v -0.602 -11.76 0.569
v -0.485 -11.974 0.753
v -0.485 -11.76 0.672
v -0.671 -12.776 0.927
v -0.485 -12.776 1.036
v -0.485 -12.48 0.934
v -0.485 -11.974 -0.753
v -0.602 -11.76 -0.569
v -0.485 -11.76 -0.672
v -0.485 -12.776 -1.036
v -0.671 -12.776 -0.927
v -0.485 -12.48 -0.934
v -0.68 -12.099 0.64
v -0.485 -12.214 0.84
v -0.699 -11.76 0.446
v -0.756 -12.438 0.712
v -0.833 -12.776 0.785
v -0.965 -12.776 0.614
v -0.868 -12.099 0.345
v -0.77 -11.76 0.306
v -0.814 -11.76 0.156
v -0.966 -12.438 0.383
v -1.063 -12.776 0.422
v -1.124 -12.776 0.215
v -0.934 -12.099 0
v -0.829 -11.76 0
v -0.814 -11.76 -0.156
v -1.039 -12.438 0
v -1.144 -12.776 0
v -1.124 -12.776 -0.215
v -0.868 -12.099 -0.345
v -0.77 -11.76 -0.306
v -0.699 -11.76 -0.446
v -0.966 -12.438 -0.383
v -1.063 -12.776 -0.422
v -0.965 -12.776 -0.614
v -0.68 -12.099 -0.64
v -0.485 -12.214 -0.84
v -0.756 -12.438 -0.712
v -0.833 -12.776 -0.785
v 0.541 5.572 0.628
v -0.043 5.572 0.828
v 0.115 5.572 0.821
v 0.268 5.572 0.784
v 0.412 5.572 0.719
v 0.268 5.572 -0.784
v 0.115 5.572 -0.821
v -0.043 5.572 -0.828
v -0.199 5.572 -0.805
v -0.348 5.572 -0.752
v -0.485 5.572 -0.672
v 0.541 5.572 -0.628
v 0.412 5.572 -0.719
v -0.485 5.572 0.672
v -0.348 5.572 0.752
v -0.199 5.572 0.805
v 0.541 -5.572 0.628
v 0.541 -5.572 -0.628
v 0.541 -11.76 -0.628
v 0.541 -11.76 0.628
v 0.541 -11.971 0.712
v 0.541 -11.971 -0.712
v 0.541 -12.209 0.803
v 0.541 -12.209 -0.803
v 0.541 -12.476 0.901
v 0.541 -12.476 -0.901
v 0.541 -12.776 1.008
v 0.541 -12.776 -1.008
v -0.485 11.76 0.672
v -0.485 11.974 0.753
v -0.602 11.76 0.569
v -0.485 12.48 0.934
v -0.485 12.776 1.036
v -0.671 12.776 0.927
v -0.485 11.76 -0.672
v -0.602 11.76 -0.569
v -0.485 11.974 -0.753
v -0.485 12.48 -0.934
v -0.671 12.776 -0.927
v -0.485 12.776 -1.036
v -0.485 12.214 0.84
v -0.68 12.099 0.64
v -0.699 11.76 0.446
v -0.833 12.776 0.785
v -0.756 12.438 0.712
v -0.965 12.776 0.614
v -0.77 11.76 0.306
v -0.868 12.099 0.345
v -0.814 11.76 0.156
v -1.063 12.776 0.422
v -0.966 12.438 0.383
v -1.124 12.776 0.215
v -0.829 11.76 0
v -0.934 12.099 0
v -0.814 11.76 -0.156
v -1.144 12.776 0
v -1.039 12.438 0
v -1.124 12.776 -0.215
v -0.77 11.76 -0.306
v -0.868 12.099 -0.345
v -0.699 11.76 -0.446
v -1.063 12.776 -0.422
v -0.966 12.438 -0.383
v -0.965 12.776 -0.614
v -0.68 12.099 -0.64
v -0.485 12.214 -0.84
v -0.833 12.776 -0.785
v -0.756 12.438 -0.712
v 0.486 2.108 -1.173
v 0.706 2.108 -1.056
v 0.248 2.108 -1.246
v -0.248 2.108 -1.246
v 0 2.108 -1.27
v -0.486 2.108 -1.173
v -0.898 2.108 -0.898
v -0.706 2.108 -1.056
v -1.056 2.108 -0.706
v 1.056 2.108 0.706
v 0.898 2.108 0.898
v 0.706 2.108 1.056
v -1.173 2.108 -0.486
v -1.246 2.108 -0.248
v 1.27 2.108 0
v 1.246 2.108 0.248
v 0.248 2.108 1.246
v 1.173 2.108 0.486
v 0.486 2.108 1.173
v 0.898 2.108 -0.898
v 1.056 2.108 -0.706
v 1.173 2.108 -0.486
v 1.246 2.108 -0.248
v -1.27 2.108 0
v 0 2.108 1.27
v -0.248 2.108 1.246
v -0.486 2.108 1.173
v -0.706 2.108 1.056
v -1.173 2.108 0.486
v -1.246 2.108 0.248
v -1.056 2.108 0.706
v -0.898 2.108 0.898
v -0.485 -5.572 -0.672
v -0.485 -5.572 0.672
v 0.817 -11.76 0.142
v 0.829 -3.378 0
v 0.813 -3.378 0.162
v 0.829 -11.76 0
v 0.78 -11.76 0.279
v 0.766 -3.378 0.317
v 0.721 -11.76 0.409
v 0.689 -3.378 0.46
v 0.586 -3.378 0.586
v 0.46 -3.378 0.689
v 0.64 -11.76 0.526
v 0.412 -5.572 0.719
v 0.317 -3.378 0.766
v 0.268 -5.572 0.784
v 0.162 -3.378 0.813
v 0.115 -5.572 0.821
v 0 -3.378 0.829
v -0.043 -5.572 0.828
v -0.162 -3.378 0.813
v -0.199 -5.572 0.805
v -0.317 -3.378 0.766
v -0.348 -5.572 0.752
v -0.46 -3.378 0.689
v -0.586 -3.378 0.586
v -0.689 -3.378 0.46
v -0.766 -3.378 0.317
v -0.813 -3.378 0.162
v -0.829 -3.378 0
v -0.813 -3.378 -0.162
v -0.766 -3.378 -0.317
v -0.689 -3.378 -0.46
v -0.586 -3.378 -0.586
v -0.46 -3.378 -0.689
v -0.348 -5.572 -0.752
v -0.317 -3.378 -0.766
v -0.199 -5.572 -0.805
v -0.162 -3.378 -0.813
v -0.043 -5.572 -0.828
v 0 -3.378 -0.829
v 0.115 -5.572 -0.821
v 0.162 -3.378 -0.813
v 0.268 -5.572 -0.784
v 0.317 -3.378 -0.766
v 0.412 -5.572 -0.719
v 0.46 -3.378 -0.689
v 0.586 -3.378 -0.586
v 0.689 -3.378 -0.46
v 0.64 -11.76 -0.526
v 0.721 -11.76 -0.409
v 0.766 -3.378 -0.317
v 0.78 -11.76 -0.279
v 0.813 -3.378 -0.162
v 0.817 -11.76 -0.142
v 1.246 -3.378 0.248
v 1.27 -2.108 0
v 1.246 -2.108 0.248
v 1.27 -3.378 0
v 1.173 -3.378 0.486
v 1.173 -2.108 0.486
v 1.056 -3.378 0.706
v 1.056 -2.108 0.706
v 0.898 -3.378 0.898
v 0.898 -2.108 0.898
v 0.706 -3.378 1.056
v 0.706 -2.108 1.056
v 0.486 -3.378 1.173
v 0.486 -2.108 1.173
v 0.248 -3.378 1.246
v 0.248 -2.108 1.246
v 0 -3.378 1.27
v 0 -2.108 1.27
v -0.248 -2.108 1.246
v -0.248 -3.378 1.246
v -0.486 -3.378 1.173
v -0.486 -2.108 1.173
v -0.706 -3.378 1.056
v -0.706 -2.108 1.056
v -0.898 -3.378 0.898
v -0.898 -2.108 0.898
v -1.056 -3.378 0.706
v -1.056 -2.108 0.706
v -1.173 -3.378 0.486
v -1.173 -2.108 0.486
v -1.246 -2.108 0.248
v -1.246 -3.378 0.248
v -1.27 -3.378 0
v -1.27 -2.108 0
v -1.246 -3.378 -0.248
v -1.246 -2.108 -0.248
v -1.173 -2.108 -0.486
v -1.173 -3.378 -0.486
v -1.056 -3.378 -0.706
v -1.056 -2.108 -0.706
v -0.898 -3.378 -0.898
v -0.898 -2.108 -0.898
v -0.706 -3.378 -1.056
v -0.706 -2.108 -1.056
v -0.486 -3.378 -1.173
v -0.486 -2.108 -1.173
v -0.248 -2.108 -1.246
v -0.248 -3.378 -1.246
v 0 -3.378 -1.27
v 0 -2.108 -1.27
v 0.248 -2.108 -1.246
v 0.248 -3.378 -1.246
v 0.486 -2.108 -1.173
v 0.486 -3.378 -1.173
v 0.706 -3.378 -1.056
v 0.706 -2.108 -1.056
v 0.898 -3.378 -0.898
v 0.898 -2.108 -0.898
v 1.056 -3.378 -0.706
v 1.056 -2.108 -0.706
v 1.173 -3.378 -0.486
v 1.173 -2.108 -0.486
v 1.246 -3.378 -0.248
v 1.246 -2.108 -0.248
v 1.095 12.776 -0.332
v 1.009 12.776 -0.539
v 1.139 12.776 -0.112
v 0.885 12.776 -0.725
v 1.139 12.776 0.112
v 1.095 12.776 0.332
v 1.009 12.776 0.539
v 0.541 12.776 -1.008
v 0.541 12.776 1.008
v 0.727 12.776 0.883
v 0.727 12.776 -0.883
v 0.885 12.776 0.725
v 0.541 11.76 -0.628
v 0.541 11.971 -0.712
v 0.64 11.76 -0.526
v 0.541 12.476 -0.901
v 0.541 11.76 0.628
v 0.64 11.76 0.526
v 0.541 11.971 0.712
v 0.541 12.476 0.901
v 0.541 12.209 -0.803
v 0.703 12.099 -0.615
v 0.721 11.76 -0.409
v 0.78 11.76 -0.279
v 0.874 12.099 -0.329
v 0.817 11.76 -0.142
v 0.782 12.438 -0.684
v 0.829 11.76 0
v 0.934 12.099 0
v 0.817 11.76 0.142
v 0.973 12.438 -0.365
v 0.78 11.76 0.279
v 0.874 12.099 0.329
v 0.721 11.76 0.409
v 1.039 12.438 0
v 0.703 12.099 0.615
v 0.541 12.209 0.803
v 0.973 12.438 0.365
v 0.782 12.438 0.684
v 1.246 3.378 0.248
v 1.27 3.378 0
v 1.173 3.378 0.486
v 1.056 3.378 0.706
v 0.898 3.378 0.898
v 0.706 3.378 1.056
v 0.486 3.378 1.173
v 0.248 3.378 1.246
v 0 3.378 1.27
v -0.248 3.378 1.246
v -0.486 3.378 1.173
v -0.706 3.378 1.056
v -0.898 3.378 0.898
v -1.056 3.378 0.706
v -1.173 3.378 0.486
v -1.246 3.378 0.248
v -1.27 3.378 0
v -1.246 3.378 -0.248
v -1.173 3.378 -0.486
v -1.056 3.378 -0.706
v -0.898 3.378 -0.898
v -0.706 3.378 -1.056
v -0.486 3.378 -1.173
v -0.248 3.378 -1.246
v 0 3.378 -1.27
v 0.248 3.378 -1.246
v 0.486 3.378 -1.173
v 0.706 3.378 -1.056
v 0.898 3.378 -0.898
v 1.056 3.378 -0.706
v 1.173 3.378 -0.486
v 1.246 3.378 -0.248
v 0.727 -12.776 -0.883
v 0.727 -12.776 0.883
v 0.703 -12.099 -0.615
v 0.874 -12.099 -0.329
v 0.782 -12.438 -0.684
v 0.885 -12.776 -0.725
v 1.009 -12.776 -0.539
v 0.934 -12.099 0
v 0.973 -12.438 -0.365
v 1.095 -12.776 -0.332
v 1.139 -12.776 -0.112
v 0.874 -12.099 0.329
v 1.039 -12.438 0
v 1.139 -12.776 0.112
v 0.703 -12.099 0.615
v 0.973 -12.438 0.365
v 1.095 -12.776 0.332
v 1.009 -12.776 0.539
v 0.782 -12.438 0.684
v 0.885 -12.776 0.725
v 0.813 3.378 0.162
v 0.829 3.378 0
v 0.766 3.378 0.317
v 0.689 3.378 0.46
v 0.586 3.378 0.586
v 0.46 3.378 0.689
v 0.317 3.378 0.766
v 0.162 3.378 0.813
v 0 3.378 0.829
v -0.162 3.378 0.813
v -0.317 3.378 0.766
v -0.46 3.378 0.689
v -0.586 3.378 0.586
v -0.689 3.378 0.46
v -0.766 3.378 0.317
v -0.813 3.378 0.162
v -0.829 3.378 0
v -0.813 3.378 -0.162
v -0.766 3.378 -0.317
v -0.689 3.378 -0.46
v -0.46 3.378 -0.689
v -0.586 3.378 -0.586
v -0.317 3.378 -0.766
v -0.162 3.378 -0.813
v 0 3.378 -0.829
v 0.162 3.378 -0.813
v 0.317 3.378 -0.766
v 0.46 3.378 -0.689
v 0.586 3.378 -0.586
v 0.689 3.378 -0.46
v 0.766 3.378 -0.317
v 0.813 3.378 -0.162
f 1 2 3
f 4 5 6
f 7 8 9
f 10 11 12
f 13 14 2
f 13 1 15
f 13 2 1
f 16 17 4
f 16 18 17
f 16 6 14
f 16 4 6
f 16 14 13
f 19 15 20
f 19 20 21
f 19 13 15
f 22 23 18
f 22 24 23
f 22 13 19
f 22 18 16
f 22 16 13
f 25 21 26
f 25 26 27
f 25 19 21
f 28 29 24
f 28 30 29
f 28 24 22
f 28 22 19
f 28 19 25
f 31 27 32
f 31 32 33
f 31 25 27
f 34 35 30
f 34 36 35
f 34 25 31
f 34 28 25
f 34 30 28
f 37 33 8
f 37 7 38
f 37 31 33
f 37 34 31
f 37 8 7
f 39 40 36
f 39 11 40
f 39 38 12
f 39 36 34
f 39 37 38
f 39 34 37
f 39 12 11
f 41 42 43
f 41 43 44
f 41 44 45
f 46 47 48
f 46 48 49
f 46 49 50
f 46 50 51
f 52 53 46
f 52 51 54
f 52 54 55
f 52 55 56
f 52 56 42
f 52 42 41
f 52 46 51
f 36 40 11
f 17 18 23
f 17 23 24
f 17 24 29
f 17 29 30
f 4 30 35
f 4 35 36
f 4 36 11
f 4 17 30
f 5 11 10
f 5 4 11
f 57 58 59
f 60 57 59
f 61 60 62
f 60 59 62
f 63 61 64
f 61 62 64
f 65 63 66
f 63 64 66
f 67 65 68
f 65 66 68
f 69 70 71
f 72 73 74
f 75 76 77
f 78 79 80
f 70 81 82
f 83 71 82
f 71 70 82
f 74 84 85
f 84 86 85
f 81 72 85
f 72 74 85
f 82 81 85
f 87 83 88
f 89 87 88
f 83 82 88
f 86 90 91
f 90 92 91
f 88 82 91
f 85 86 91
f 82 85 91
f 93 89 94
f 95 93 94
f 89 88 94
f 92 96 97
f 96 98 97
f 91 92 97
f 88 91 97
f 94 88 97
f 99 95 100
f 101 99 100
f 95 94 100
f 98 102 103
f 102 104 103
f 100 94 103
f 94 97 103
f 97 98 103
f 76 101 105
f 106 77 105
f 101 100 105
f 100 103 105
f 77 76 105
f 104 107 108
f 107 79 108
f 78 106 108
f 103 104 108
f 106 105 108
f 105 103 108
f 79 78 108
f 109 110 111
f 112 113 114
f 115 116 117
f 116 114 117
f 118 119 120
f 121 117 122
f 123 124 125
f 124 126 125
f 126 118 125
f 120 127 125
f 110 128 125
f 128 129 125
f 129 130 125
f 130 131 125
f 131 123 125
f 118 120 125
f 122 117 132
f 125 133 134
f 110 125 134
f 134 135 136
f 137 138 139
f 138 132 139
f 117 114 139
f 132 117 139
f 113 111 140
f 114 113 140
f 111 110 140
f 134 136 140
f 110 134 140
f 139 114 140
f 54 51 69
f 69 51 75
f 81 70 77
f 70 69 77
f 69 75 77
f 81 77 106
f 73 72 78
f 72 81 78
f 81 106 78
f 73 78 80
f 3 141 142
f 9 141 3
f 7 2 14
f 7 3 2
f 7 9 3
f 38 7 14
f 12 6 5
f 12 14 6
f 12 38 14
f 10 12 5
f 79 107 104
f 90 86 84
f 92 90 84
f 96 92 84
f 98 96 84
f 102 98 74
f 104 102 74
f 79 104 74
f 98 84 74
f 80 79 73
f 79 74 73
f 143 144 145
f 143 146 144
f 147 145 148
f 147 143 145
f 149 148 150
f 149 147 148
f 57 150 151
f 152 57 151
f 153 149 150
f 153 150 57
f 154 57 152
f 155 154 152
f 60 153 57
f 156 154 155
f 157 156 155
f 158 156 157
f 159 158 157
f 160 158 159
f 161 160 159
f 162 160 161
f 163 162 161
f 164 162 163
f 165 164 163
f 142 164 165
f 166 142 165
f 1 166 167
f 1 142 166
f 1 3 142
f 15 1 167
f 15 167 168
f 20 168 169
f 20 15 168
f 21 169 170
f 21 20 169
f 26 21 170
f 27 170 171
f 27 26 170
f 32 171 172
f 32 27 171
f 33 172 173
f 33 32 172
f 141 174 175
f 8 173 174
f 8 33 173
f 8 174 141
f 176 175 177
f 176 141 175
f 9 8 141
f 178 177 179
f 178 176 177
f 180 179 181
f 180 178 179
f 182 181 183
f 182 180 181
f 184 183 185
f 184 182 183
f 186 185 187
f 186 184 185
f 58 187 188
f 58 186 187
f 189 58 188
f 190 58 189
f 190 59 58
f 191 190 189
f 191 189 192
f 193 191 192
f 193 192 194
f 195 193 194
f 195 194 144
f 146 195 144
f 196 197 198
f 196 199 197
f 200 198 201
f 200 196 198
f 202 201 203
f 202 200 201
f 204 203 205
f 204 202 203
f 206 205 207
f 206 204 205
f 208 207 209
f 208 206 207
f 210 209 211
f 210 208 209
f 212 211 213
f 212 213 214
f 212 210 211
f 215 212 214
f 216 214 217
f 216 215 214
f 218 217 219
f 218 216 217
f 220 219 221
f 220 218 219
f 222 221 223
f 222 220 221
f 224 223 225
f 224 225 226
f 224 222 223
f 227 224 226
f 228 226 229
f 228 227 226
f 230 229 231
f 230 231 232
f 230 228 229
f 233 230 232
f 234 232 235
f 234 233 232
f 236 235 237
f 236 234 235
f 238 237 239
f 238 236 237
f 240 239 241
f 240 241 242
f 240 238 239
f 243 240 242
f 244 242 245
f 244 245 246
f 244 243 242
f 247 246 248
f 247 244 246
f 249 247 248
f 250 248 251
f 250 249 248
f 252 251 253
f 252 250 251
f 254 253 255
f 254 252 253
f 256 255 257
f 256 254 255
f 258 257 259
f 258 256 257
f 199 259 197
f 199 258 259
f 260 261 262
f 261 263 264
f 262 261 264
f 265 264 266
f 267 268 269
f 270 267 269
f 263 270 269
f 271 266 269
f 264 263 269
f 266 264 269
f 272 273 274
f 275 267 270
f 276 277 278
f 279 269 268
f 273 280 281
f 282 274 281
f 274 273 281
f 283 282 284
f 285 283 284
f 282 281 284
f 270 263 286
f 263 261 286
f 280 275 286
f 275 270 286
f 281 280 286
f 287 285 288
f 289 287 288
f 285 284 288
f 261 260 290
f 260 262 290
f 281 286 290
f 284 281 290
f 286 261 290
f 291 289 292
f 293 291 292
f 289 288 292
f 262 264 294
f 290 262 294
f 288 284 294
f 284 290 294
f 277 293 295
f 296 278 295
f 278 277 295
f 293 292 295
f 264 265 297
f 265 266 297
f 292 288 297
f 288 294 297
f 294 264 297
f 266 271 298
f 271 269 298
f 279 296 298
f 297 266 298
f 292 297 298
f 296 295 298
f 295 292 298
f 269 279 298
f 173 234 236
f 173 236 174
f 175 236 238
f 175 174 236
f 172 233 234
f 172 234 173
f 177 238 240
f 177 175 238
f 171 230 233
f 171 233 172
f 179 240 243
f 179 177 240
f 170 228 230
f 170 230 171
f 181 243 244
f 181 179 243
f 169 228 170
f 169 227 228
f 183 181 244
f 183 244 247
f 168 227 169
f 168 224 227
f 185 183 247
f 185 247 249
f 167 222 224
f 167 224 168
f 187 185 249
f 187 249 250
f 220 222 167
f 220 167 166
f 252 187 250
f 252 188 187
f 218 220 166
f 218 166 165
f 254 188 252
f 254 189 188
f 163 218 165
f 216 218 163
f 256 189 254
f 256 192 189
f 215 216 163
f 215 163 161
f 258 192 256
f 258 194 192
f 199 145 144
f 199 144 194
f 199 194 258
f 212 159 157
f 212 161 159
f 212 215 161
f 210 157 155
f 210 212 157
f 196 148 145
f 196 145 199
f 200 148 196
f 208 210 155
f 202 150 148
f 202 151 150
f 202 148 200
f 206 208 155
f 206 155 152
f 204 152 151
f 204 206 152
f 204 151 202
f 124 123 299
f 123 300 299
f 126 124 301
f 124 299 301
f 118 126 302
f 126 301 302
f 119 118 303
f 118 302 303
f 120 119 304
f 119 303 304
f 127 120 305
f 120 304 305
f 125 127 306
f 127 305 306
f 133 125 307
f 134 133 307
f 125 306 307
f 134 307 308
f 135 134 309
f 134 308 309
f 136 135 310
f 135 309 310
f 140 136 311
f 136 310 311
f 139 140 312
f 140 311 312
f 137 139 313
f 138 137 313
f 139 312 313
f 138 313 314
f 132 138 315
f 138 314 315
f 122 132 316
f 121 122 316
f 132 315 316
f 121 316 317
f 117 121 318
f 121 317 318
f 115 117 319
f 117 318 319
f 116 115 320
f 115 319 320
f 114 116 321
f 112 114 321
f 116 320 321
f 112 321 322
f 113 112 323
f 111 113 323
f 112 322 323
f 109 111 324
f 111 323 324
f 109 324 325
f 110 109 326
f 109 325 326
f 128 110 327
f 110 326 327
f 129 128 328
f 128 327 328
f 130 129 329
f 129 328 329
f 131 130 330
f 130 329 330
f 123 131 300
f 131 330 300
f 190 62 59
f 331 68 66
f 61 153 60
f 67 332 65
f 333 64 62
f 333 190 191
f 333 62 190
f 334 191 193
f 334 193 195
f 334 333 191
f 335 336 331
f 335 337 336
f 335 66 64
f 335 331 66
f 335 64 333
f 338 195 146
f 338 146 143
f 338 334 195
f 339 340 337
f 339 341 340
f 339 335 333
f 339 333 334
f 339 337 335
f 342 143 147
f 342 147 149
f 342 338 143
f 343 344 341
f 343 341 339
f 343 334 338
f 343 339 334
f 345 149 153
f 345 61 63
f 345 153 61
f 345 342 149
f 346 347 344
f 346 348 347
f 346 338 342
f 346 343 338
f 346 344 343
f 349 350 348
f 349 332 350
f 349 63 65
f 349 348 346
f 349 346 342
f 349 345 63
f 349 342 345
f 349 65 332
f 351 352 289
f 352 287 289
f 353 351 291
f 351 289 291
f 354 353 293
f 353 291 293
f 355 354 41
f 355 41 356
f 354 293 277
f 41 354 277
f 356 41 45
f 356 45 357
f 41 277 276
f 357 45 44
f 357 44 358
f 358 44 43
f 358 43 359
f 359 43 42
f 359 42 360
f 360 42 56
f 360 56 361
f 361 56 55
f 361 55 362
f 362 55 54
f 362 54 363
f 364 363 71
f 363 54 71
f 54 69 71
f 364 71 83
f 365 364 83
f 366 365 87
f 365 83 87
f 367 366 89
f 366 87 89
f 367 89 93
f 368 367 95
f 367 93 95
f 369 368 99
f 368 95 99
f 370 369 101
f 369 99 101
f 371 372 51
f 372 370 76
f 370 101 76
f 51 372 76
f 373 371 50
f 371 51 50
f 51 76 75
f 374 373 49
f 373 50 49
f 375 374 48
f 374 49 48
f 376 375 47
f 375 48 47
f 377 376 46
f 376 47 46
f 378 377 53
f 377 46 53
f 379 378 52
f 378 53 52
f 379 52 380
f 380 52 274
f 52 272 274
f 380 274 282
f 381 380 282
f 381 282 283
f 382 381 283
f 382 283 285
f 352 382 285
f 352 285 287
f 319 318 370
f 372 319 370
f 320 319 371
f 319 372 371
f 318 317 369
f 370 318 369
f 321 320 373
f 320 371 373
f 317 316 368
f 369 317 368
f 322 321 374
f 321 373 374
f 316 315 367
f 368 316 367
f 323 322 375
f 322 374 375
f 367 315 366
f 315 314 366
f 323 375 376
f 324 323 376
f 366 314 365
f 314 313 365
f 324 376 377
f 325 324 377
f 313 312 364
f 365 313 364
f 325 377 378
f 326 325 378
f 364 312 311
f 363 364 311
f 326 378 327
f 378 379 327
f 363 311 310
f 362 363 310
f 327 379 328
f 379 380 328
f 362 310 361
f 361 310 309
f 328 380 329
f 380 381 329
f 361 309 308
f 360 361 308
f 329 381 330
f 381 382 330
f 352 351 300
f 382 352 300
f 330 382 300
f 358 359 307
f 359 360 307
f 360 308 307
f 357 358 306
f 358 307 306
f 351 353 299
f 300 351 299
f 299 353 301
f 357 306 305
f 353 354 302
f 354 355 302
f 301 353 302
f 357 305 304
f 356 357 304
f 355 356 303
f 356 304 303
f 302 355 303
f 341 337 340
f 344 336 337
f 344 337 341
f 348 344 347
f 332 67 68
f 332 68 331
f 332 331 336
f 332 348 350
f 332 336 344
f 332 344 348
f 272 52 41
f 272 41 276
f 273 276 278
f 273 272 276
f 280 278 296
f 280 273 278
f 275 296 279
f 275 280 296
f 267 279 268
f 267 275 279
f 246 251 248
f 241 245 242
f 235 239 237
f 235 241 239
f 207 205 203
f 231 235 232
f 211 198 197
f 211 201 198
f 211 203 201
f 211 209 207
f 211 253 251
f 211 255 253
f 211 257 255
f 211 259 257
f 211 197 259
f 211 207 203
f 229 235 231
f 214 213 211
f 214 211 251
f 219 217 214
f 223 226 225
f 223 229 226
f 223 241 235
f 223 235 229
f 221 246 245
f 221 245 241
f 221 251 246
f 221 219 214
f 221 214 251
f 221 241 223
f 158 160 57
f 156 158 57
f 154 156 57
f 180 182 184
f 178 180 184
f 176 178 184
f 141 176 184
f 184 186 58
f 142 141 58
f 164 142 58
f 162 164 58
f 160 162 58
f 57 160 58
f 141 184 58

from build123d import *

# Parameters (mm, degrees)
F2_W          = 1.025399717
F2_H          = 7.9063717276
F3_DEPTH      = 1.271
F3_DEPTH_BACK = 25.4


with BuildPart() as f1:
    # F0 (on Top) → F1 (revolve)
    with BuildSketch(Plane.XY):
        Polygon((0, 12.7763244778), (0, 2.1083244778), (1.27, 2.1083244778), (1.27, 3.3783244778), (0.8288369562, 3.3783244778), (0.8288369562, 11.7603244778), (0.8288369562, 12.7763244778), align=None)
        Polygon((1.1440247763, 12.7763244778), (0.8288369562, 12.7763244778), (0.8288369562, 11.7603244778), align=None)
    revolve(axis=Axis((0, 7.4423244778, 0), (0, -1, 0)))

    # F2 (on Top) → F3 (cut, two sides)
    with BuildSketch(Plane.XY) as f3_sk:
        with Locations((0.0281461107, 9.524891153)):
            Rectangle(F2_W, F2_H)
    extrude(amount=-F3_DEPTH, mode=Mode.SUBTRACT)
    extrude(f3_sk.sketch, amount=F3_DEPTH_BACK, mode=Mode.SUBTRACT)


with BuildPart() as f4_1:
    # F4: instance of F1
    add(f1.part.mirror(Plane.XZ))


solid = Compound([f1.part, f4_1.part])
